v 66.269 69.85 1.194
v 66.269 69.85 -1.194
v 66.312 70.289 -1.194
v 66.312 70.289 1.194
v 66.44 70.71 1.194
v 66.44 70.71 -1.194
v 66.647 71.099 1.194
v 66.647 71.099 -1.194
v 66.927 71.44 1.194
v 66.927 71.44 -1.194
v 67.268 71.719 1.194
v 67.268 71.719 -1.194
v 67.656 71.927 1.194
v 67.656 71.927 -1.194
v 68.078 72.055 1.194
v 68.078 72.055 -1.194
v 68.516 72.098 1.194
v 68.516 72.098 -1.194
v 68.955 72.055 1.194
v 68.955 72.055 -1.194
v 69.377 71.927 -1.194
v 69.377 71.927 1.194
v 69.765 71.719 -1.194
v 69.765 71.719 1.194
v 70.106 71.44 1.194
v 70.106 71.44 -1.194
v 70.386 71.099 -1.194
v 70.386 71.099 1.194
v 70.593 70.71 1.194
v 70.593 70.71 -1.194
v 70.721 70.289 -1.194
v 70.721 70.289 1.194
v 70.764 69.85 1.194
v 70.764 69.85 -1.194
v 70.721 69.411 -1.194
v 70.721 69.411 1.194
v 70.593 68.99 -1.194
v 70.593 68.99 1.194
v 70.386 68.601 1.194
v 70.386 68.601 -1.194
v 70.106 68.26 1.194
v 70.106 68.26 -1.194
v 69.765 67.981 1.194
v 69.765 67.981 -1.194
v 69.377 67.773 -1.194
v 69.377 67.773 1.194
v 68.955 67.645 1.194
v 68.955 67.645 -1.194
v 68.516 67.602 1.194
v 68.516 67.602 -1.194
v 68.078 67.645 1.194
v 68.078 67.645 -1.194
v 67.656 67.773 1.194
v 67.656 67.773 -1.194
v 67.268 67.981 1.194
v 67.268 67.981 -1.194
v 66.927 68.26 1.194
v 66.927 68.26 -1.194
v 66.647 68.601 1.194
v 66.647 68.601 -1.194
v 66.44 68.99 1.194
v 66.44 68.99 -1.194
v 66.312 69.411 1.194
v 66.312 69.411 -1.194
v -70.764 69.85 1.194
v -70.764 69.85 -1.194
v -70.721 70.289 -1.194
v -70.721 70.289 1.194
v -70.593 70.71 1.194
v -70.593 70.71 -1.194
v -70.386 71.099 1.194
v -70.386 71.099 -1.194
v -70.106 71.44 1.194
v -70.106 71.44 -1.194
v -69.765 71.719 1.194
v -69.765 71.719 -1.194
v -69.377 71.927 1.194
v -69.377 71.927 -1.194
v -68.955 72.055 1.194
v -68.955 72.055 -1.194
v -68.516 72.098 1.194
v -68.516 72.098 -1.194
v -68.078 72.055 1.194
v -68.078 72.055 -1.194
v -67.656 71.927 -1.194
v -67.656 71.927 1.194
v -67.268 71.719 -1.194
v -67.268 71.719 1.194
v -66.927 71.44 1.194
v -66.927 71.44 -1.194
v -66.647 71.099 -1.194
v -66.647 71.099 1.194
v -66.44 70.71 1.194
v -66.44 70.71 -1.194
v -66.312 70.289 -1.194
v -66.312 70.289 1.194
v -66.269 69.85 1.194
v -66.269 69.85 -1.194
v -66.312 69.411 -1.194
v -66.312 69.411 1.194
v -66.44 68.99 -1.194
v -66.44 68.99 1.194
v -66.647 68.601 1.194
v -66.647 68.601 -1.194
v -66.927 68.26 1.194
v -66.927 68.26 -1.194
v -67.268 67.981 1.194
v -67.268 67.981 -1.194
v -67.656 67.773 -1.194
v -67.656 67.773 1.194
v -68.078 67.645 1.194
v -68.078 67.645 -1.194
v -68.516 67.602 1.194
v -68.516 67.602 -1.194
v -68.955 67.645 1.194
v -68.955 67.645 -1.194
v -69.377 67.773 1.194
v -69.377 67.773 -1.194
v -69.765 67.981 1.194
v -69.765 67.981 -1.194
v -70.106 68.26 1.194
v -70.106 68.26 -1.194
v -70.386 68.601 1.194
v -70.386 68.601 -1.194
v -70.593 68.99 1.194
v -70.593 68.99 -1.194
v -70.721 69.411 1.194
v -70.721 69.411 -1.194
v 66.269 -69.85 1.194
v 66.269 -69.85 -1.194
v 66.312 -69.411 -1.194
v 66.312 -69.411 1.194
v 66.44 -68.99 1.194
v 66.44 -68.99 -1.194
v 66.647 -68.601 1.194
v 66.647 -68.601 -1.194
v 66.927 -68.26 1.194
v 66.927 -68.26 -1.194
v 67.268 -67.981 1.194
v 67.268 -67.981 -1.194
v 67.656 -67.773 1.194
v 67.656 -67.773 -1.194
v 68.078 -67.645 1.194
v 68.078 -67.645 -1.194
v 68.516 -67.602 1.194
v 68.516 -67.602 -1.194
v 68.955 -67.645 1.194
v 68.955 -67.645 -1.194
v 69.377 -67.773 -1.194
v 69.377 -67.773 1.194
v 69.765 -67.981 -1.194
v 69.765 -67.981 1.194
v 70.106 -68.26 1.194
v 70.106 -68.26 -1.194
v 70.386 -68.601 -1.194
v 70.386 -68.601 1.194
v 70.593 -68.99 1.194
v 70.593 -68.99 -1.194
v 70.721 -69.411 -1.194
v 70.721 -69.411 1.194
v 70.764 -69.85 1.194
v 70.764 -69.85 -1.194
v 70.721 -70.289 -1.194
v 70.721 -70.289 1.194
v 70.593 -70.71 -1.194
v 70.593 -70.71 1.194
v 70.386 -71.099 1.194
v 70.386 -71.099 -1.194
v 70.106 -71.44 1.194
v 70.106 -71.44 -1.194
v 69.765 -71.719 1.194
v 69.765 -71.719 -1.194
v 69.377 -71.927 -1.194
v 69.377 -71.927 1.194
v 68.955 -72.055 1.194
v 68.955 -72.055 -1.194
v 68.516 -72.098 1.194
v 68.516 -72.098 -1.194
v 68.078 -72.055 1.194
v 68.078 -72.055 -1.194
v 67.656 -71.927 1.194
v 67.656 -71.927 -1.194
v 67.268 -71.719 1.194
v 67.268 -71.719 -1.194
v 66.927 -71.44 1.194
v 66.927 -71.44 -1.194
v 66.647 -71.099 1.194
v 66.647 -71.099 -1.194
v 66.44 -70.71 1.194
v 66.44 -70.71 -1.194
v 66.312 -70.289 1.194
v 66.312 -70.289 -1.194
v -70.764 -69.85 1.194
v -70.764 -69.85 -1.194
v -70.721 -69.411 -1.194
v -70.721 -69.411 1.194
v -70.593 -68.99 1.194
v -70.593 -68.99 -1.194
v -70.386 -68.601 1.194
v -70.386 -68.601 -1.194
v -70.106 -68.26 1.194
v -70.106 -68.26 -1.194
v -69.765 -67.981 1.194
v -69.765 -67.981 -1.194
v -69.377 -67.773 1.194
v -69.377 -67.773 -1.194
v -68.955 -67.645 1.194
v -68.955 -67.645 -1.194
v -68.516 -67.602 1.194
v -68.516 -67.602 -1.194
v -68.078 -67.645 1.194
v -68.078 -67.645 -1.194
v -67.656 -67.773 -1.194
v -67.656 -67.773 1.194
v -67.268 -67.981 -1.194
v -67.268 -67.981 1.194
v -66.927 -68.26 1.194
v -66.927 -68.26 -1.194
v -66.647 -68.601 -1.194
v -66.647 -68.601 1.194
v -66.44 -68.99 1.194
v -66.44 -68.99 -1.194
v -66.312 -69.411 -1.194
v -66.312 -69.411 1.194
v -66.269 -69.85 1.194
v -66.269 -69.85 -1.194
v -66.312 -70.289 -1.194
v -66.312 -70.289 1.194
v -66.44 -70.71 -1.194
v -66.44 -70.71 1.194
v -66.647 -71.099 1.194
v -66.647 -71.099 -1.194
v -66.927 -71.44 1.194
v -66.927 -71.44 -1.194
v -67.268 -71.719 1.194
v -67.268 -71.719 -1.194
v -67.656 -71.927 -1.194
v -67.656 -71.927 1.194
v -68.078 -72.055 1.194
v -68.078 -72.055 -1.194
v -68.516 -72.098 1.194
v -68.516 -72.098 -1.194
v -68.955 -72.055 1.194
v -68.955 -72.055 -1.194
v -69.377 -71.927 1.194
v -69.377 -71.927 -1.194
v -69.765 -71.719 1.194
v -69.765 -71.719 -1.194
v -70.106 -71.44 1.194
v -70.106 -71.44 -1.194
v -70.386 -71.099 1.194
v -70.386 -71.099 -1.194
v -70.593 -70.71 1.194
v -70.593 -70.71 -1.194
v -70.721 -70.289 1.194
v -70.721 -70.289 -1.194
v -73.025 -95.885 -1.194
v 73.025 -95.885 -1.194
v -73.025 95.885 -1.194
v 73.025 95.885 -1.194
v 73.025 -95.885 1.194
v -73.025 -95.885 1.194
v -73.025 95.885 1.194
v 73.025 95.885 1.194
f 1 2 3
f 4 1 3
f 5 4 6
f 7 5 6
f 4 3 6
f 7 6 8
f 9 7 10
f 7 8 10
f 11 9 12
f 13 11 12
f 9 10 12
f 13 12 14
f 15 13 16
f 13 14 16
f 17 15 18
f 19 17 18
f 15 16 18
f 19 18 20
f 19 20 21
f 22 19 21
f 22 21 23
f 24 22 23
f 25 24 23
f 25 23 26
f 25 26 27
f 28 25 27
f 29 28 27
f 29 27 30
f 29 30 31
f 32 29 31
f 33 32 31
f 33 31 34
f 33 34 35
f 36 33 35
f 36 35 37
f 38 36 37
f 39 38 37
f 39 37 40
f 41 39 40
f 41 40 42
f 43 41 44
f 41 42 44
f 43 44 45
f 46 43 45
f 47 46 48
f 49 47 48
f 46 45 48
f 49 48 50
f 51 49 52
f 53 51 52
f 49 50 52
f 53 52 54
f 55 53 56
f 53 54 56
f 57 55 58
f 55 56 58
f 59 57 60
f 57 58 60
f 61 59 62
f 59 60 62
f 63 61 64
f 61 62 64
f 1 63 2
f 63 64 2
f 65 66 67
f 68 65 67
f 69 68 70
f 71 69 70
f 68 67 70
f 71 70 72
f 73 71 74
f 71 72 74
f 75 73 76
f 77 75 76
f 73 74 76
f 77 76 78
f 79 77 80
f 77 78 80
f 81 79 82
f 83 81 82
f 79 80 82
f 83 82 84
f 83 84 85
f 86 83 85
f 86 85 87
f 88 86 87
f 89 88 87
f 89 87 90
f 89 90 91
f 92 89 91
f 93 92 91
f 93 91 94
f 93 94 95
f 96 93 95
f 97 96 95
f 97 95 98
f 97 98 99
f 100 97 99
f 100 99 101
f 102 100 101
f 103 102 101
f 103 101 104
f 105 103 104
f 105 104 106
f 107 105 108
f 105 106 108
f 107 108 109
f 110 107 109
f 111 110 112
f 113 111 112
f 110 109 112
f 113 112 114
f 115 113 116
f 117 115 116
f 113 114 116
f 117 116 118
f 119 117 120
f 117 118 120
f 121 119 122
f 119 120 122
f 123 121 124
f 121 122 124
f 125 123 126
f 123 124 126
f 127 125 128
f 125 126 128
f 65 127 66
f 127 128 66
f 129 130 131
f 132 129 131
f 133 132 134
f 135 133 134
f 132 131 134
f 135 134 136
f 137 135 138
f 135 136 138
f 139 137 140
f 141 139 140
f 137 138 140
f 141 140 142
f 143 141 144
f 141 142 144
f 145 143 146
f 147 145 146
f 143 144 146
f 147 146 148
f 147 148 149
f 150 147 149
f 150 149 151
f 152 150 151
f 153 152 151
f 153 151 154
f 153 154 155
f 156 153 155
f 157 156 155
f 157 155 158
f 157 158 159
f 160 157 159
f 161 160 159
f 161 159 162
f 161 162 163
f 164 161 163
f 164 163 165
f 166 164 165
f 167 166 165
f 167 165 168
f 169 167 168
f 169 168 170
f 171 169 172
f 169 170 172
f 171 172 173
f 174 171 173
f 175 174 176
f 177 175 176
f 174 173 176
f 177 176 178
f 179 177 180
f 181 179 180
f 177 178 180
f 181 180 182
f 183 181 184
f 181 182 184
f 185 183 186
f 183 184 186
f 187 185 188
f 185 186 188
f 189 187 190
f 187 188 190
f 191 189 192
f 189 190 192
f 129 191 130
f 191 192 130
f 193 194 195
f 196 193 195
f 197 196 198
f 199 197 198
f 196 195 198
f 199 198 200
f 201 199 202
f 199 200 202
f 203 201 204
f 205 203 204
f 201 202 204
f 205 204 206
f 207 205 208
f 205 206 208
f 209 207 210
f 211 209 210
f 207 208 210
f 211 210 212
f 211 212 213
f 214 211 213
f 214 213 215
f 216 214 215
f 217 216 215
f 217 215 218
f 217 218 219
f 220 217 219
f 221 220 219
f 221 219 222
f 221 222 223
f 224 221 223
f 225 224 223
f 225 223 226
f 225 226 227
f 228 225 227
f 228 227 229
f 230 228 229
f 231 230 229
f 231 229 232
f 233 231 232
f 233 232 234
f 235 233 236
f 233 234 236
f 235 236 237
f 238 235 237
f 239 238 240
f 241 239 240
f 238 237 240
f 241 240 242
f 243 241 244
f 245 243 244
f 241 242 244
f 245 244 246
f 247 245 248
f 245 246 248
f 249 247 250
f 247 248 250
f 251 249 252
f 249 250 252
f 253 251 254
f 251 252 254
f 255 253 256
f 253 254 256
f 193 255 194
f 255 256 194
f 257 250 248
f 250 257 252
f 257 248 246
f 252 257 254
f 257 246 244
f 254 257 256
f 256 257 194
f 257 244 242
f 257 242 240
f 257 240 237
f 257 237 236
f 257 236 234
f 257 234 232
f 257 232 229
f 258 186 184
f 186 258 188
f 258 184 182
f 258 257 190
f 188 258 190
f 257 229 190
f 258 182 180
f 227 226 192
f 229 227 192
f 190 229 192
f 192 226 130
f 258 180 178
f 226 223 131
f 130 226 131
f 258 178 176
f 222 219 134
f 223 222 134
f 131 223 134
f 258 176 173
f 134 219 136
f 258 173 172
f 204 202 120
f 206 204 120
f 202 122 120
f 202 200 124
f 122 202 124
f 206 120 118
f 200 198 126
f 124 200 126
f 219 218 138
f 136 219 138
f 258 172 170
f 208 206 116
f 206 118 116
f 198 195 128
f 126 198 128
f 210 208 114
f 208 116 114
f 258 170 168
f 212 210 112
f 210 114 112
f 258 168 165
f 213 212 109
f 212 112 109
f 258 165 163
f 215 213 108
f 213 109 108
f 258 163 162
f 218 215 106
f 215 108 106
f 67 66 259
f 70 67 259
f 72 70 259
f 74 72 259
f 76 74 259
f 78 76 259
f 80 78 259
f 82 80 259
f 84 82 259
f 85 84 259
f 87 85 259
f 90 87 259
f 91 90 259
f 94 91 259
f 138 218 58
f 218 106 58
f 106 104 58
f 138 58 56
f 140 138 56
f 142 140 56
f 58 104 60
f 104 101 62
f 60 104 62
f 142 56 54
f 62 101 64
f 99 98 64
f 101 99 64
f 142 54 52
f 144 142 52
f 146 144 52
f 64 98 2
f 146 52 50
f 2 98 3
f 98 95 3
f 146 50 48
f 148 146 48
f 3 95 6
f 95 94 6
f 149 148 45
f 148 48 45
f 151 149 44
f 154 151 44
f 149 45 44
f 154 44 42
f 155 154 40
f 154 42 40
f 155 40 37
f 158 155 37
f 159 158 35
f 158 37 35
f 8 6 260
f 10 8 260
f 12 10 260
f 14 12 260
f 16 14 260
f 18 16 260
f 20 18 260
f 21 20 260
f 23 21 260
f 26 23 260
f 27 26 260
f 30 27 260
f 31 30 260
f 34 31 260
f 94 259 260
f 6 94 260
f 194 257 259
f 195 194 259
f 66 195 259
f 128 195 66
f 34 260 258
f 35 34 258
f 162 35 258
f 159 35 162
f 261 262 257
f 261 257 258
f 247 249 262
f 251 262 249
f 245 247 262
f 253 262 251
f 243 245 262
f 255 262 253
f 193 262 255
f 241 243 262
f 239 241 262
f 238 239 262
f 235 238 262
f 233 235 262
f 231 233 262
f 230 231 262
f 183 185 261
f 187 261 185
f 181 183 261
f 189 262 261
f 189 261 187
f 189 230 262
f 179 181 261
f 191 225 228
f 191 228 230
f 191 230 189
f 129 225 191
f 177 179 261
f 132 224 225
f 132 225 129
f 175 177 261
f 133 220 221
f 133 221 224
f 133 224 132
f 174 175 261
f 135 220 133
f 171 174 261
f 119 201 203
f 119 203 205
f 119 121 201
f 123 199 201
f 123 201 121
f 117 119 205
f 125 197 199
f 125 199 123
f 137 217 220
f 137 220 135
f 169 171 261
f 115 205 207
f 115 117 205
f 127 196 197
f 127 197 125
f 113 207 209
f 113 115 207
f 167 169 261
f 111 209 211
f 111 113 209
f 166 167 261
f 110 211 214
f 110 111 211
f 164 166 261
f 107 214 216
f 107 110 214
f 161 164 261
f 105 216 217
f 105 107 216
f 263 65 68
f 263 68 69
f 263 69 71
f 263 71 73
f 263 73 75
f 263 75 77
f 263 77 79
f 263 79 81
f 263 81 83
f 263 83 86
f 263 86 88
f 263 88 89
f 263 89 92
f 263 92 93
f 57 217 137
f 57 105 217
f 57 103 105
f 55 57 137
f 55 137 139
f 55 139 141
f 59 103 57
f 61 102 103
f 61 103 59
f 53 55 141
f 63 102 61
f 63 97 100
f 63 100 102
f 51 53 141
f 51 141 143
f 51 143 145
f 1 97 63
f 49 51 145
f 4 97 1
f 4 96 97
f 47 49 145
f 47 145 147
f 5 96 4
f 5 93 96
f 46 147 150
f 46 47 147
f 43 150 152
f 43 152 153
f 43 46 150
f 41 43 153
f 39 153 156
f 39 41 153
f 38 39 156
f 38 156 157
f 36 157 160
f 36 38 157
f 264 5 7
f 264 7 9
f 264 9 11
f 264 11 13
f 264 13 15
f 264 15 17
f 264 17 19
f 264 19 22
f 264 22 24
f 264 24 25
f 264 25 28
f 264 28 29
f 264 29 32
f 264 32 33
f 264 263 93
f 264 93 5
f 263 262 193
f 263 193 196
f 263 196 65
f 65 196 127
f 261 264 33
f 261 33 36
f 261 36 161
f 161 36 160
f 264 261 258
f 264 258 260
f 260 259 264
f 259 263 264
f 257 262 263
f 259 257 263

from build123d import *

# Parameters (mm, degrees)
SKETCH1_W             = 146.05
SKETCH1_H             = 191.77
BOSS_EXTRUDE1_DEPTH   = 1.1938
F_8_CLEARANCE_HOLE1_D = 4.4958


with BuildPart() as part:
    # Sketch1 → Boss-Extrude1 (new body, symmetric)
    with BuildSketch(Plane.XY):
        Rectangle(SKETCH1_W, SKETCH1_H)
    extrude(amount=BOSS_EXTRUDE1_DEPTH, both=True)

    # #8 Clearance Hole1 (through all)
    with Locations(Plane(origin=(68.5165, 69.85, 1.1938), x_dir=(1, 0, 0), z_dir=(0, 0, 1))):
        with Locations((0, 0), (-137.033, 0), (-137.033, -139.7), (0, -139.7)):
            Hole(F_8_CLEARANCE_HOLE1_D / 2)


solid = part.part
